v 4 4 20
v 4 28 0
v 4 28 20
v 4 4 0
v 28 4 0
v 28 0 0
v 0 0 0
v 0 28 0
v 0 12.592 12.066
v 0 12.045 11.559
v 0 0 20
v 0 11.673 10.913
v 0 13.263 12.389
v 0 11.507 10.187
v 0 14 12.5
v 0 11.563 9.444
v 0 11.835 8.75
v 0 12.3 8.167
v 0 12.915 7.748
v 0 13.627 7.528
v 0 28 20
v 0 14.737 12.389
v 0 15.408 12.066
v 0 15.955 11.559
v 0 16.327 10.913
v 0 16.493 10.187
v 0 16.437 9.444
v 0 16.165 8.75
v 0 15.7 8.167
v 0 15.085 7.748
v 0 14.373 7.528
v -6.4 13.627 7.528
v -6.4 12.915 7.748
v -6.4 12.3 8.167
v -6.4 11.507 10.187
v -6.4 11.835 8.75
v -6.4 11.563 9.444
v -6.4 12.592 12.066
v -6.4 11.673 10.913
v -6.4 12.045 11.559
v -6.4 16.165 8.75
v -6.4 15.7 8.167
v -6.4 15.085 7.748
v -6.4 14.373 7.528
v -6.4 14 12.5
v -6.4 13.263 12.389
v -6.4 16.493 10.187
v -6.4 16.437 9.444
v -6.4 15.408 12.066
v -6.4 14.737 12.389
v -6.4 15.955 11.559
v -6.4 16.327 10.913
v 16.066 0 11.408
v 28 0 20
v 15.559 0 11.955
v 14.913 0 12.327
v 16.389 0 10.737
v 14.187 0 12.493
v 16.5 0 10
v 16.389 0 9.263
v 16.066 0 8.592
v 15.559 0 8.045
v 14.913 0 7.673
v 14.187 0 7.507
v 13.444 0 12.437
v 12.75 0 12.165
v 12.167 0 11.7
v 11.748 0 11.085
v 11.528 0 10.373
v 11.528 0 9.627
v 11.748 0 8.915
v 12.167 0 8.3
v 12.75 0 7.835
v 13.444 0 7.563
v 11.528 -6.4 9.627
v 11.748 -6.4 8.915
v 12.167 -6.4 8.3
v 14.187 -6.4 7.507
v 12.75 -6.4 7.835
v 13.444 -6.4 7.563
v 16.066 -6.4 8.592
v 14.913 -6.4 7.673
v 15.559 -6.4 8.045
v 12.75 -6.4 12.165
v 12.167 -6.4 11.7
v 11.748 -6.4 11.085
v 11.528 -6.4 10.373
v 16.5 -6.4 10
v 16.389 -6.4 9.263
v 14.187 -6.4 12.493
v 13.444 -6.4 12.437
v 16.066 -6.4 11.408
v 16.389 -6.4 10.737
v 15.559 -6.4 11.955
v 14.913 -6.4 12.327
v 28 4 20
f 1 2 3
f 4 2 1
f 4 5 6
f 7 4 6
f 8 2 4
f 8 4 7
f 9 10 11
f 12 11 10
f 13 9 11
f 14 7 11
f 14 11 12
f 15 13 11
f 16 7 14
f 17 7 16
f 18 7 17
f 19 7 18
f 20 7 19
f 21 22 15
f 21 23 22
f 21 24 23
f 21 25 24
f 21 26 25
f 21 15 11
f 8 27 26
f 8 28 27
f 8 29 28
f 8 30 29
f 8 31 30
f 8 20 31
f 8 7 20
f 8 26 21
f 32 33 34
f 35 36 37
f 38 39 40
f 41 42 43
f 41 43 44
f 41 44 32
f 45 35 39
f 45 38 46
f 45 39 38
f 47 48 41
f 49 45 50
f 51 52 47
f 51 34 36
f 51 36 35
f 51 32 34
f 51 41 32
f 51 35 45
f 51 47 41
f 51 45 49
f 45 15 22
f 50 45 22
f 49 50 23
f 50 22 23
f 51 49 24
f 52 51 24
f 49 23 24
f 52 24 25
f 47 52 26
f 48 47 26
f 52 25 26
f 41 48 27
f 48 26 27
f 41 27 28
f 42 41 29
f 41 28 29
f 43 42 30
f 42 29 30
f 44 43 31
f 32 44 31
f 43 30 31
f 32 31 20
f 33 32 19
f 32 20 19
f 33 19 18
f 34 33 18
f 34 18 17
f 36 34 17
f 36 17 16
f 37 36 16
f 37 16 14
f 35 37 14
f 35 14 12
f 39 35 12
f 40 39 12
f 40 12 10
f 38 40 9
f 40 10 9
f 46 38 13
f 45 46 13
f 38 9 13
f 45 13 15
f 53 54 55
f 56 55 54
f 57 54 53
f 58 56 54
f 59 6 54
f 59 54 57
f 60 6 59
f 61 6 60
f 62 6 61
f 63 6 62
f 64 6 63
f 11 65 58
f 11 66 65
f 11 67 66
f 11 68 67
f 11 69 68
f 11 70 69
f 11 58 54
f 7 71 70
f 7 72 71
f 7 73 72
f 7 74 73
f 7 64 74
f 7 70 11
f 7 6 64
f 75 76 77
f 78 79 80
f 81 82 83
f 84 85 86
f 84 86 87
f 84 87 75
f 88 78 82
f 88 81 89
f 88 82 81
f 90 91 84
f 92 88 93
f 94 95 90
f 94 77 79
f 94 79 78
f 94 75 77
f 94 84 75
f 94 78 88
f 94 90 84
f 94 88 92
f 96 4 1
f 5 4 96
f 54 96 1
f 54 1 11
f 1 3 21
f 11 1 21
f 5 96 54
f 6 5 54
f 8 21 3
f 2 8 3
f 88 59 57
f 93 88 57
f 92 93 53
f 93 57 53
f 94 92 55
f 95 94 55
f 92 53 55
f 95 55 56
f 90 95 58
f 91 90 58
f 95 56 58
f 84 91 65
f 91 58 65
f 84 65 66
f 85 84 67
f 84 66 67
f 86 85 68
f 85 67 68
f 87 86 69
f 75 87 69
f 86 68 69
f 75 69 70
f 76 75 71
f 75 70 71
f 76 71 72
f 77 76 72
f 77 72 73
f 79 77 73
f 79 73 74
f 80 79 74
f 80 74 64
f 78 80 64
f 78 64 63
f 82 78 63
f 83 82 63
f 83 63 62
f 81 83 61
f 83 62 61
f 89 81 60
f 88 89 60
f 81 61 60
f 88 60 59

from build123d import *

# Parameters (mm, degrees)
BOSS_EXTRUDE1_DEPTH = 20
SKETCH5_R           = 2.5
BOSS_EXTRUDE6_DEPTH = 6.4
SKETCH6_R           = 2.5
BOSS_EXTRUDE7_DEPTH = 6.4


with BuildPart() as part:
    # Sketch1 → Boss-Extrude1 (new body)
    with BuildSketch(Plane.XY):
        Polygon((0, 0), (0, 28), (4, 28), (4, 4), (28, 4), (28, 0), align=None)
    extrude(amount=BOSS_EXTRUDE1_DEPTH)

    # Sketch5 → Boss-Extrude6 (add)
    with BuildSketch(Plane.ZY):
        with Locations((10, 14)):
            Circle(SKETCH5_R)
    extrude(amount=BOSS_EXTRUDE6_DEPTH)

    # Sketch6 → Boss-Extrude7 (add)
    with BuildSketch(Plane.XZ):
        with Locations((14, 10)):
            Circle(SKETCH6_R)
    extrude(amount=BOSS_EXTRUDE7_DEPTH)


solid = part.part
